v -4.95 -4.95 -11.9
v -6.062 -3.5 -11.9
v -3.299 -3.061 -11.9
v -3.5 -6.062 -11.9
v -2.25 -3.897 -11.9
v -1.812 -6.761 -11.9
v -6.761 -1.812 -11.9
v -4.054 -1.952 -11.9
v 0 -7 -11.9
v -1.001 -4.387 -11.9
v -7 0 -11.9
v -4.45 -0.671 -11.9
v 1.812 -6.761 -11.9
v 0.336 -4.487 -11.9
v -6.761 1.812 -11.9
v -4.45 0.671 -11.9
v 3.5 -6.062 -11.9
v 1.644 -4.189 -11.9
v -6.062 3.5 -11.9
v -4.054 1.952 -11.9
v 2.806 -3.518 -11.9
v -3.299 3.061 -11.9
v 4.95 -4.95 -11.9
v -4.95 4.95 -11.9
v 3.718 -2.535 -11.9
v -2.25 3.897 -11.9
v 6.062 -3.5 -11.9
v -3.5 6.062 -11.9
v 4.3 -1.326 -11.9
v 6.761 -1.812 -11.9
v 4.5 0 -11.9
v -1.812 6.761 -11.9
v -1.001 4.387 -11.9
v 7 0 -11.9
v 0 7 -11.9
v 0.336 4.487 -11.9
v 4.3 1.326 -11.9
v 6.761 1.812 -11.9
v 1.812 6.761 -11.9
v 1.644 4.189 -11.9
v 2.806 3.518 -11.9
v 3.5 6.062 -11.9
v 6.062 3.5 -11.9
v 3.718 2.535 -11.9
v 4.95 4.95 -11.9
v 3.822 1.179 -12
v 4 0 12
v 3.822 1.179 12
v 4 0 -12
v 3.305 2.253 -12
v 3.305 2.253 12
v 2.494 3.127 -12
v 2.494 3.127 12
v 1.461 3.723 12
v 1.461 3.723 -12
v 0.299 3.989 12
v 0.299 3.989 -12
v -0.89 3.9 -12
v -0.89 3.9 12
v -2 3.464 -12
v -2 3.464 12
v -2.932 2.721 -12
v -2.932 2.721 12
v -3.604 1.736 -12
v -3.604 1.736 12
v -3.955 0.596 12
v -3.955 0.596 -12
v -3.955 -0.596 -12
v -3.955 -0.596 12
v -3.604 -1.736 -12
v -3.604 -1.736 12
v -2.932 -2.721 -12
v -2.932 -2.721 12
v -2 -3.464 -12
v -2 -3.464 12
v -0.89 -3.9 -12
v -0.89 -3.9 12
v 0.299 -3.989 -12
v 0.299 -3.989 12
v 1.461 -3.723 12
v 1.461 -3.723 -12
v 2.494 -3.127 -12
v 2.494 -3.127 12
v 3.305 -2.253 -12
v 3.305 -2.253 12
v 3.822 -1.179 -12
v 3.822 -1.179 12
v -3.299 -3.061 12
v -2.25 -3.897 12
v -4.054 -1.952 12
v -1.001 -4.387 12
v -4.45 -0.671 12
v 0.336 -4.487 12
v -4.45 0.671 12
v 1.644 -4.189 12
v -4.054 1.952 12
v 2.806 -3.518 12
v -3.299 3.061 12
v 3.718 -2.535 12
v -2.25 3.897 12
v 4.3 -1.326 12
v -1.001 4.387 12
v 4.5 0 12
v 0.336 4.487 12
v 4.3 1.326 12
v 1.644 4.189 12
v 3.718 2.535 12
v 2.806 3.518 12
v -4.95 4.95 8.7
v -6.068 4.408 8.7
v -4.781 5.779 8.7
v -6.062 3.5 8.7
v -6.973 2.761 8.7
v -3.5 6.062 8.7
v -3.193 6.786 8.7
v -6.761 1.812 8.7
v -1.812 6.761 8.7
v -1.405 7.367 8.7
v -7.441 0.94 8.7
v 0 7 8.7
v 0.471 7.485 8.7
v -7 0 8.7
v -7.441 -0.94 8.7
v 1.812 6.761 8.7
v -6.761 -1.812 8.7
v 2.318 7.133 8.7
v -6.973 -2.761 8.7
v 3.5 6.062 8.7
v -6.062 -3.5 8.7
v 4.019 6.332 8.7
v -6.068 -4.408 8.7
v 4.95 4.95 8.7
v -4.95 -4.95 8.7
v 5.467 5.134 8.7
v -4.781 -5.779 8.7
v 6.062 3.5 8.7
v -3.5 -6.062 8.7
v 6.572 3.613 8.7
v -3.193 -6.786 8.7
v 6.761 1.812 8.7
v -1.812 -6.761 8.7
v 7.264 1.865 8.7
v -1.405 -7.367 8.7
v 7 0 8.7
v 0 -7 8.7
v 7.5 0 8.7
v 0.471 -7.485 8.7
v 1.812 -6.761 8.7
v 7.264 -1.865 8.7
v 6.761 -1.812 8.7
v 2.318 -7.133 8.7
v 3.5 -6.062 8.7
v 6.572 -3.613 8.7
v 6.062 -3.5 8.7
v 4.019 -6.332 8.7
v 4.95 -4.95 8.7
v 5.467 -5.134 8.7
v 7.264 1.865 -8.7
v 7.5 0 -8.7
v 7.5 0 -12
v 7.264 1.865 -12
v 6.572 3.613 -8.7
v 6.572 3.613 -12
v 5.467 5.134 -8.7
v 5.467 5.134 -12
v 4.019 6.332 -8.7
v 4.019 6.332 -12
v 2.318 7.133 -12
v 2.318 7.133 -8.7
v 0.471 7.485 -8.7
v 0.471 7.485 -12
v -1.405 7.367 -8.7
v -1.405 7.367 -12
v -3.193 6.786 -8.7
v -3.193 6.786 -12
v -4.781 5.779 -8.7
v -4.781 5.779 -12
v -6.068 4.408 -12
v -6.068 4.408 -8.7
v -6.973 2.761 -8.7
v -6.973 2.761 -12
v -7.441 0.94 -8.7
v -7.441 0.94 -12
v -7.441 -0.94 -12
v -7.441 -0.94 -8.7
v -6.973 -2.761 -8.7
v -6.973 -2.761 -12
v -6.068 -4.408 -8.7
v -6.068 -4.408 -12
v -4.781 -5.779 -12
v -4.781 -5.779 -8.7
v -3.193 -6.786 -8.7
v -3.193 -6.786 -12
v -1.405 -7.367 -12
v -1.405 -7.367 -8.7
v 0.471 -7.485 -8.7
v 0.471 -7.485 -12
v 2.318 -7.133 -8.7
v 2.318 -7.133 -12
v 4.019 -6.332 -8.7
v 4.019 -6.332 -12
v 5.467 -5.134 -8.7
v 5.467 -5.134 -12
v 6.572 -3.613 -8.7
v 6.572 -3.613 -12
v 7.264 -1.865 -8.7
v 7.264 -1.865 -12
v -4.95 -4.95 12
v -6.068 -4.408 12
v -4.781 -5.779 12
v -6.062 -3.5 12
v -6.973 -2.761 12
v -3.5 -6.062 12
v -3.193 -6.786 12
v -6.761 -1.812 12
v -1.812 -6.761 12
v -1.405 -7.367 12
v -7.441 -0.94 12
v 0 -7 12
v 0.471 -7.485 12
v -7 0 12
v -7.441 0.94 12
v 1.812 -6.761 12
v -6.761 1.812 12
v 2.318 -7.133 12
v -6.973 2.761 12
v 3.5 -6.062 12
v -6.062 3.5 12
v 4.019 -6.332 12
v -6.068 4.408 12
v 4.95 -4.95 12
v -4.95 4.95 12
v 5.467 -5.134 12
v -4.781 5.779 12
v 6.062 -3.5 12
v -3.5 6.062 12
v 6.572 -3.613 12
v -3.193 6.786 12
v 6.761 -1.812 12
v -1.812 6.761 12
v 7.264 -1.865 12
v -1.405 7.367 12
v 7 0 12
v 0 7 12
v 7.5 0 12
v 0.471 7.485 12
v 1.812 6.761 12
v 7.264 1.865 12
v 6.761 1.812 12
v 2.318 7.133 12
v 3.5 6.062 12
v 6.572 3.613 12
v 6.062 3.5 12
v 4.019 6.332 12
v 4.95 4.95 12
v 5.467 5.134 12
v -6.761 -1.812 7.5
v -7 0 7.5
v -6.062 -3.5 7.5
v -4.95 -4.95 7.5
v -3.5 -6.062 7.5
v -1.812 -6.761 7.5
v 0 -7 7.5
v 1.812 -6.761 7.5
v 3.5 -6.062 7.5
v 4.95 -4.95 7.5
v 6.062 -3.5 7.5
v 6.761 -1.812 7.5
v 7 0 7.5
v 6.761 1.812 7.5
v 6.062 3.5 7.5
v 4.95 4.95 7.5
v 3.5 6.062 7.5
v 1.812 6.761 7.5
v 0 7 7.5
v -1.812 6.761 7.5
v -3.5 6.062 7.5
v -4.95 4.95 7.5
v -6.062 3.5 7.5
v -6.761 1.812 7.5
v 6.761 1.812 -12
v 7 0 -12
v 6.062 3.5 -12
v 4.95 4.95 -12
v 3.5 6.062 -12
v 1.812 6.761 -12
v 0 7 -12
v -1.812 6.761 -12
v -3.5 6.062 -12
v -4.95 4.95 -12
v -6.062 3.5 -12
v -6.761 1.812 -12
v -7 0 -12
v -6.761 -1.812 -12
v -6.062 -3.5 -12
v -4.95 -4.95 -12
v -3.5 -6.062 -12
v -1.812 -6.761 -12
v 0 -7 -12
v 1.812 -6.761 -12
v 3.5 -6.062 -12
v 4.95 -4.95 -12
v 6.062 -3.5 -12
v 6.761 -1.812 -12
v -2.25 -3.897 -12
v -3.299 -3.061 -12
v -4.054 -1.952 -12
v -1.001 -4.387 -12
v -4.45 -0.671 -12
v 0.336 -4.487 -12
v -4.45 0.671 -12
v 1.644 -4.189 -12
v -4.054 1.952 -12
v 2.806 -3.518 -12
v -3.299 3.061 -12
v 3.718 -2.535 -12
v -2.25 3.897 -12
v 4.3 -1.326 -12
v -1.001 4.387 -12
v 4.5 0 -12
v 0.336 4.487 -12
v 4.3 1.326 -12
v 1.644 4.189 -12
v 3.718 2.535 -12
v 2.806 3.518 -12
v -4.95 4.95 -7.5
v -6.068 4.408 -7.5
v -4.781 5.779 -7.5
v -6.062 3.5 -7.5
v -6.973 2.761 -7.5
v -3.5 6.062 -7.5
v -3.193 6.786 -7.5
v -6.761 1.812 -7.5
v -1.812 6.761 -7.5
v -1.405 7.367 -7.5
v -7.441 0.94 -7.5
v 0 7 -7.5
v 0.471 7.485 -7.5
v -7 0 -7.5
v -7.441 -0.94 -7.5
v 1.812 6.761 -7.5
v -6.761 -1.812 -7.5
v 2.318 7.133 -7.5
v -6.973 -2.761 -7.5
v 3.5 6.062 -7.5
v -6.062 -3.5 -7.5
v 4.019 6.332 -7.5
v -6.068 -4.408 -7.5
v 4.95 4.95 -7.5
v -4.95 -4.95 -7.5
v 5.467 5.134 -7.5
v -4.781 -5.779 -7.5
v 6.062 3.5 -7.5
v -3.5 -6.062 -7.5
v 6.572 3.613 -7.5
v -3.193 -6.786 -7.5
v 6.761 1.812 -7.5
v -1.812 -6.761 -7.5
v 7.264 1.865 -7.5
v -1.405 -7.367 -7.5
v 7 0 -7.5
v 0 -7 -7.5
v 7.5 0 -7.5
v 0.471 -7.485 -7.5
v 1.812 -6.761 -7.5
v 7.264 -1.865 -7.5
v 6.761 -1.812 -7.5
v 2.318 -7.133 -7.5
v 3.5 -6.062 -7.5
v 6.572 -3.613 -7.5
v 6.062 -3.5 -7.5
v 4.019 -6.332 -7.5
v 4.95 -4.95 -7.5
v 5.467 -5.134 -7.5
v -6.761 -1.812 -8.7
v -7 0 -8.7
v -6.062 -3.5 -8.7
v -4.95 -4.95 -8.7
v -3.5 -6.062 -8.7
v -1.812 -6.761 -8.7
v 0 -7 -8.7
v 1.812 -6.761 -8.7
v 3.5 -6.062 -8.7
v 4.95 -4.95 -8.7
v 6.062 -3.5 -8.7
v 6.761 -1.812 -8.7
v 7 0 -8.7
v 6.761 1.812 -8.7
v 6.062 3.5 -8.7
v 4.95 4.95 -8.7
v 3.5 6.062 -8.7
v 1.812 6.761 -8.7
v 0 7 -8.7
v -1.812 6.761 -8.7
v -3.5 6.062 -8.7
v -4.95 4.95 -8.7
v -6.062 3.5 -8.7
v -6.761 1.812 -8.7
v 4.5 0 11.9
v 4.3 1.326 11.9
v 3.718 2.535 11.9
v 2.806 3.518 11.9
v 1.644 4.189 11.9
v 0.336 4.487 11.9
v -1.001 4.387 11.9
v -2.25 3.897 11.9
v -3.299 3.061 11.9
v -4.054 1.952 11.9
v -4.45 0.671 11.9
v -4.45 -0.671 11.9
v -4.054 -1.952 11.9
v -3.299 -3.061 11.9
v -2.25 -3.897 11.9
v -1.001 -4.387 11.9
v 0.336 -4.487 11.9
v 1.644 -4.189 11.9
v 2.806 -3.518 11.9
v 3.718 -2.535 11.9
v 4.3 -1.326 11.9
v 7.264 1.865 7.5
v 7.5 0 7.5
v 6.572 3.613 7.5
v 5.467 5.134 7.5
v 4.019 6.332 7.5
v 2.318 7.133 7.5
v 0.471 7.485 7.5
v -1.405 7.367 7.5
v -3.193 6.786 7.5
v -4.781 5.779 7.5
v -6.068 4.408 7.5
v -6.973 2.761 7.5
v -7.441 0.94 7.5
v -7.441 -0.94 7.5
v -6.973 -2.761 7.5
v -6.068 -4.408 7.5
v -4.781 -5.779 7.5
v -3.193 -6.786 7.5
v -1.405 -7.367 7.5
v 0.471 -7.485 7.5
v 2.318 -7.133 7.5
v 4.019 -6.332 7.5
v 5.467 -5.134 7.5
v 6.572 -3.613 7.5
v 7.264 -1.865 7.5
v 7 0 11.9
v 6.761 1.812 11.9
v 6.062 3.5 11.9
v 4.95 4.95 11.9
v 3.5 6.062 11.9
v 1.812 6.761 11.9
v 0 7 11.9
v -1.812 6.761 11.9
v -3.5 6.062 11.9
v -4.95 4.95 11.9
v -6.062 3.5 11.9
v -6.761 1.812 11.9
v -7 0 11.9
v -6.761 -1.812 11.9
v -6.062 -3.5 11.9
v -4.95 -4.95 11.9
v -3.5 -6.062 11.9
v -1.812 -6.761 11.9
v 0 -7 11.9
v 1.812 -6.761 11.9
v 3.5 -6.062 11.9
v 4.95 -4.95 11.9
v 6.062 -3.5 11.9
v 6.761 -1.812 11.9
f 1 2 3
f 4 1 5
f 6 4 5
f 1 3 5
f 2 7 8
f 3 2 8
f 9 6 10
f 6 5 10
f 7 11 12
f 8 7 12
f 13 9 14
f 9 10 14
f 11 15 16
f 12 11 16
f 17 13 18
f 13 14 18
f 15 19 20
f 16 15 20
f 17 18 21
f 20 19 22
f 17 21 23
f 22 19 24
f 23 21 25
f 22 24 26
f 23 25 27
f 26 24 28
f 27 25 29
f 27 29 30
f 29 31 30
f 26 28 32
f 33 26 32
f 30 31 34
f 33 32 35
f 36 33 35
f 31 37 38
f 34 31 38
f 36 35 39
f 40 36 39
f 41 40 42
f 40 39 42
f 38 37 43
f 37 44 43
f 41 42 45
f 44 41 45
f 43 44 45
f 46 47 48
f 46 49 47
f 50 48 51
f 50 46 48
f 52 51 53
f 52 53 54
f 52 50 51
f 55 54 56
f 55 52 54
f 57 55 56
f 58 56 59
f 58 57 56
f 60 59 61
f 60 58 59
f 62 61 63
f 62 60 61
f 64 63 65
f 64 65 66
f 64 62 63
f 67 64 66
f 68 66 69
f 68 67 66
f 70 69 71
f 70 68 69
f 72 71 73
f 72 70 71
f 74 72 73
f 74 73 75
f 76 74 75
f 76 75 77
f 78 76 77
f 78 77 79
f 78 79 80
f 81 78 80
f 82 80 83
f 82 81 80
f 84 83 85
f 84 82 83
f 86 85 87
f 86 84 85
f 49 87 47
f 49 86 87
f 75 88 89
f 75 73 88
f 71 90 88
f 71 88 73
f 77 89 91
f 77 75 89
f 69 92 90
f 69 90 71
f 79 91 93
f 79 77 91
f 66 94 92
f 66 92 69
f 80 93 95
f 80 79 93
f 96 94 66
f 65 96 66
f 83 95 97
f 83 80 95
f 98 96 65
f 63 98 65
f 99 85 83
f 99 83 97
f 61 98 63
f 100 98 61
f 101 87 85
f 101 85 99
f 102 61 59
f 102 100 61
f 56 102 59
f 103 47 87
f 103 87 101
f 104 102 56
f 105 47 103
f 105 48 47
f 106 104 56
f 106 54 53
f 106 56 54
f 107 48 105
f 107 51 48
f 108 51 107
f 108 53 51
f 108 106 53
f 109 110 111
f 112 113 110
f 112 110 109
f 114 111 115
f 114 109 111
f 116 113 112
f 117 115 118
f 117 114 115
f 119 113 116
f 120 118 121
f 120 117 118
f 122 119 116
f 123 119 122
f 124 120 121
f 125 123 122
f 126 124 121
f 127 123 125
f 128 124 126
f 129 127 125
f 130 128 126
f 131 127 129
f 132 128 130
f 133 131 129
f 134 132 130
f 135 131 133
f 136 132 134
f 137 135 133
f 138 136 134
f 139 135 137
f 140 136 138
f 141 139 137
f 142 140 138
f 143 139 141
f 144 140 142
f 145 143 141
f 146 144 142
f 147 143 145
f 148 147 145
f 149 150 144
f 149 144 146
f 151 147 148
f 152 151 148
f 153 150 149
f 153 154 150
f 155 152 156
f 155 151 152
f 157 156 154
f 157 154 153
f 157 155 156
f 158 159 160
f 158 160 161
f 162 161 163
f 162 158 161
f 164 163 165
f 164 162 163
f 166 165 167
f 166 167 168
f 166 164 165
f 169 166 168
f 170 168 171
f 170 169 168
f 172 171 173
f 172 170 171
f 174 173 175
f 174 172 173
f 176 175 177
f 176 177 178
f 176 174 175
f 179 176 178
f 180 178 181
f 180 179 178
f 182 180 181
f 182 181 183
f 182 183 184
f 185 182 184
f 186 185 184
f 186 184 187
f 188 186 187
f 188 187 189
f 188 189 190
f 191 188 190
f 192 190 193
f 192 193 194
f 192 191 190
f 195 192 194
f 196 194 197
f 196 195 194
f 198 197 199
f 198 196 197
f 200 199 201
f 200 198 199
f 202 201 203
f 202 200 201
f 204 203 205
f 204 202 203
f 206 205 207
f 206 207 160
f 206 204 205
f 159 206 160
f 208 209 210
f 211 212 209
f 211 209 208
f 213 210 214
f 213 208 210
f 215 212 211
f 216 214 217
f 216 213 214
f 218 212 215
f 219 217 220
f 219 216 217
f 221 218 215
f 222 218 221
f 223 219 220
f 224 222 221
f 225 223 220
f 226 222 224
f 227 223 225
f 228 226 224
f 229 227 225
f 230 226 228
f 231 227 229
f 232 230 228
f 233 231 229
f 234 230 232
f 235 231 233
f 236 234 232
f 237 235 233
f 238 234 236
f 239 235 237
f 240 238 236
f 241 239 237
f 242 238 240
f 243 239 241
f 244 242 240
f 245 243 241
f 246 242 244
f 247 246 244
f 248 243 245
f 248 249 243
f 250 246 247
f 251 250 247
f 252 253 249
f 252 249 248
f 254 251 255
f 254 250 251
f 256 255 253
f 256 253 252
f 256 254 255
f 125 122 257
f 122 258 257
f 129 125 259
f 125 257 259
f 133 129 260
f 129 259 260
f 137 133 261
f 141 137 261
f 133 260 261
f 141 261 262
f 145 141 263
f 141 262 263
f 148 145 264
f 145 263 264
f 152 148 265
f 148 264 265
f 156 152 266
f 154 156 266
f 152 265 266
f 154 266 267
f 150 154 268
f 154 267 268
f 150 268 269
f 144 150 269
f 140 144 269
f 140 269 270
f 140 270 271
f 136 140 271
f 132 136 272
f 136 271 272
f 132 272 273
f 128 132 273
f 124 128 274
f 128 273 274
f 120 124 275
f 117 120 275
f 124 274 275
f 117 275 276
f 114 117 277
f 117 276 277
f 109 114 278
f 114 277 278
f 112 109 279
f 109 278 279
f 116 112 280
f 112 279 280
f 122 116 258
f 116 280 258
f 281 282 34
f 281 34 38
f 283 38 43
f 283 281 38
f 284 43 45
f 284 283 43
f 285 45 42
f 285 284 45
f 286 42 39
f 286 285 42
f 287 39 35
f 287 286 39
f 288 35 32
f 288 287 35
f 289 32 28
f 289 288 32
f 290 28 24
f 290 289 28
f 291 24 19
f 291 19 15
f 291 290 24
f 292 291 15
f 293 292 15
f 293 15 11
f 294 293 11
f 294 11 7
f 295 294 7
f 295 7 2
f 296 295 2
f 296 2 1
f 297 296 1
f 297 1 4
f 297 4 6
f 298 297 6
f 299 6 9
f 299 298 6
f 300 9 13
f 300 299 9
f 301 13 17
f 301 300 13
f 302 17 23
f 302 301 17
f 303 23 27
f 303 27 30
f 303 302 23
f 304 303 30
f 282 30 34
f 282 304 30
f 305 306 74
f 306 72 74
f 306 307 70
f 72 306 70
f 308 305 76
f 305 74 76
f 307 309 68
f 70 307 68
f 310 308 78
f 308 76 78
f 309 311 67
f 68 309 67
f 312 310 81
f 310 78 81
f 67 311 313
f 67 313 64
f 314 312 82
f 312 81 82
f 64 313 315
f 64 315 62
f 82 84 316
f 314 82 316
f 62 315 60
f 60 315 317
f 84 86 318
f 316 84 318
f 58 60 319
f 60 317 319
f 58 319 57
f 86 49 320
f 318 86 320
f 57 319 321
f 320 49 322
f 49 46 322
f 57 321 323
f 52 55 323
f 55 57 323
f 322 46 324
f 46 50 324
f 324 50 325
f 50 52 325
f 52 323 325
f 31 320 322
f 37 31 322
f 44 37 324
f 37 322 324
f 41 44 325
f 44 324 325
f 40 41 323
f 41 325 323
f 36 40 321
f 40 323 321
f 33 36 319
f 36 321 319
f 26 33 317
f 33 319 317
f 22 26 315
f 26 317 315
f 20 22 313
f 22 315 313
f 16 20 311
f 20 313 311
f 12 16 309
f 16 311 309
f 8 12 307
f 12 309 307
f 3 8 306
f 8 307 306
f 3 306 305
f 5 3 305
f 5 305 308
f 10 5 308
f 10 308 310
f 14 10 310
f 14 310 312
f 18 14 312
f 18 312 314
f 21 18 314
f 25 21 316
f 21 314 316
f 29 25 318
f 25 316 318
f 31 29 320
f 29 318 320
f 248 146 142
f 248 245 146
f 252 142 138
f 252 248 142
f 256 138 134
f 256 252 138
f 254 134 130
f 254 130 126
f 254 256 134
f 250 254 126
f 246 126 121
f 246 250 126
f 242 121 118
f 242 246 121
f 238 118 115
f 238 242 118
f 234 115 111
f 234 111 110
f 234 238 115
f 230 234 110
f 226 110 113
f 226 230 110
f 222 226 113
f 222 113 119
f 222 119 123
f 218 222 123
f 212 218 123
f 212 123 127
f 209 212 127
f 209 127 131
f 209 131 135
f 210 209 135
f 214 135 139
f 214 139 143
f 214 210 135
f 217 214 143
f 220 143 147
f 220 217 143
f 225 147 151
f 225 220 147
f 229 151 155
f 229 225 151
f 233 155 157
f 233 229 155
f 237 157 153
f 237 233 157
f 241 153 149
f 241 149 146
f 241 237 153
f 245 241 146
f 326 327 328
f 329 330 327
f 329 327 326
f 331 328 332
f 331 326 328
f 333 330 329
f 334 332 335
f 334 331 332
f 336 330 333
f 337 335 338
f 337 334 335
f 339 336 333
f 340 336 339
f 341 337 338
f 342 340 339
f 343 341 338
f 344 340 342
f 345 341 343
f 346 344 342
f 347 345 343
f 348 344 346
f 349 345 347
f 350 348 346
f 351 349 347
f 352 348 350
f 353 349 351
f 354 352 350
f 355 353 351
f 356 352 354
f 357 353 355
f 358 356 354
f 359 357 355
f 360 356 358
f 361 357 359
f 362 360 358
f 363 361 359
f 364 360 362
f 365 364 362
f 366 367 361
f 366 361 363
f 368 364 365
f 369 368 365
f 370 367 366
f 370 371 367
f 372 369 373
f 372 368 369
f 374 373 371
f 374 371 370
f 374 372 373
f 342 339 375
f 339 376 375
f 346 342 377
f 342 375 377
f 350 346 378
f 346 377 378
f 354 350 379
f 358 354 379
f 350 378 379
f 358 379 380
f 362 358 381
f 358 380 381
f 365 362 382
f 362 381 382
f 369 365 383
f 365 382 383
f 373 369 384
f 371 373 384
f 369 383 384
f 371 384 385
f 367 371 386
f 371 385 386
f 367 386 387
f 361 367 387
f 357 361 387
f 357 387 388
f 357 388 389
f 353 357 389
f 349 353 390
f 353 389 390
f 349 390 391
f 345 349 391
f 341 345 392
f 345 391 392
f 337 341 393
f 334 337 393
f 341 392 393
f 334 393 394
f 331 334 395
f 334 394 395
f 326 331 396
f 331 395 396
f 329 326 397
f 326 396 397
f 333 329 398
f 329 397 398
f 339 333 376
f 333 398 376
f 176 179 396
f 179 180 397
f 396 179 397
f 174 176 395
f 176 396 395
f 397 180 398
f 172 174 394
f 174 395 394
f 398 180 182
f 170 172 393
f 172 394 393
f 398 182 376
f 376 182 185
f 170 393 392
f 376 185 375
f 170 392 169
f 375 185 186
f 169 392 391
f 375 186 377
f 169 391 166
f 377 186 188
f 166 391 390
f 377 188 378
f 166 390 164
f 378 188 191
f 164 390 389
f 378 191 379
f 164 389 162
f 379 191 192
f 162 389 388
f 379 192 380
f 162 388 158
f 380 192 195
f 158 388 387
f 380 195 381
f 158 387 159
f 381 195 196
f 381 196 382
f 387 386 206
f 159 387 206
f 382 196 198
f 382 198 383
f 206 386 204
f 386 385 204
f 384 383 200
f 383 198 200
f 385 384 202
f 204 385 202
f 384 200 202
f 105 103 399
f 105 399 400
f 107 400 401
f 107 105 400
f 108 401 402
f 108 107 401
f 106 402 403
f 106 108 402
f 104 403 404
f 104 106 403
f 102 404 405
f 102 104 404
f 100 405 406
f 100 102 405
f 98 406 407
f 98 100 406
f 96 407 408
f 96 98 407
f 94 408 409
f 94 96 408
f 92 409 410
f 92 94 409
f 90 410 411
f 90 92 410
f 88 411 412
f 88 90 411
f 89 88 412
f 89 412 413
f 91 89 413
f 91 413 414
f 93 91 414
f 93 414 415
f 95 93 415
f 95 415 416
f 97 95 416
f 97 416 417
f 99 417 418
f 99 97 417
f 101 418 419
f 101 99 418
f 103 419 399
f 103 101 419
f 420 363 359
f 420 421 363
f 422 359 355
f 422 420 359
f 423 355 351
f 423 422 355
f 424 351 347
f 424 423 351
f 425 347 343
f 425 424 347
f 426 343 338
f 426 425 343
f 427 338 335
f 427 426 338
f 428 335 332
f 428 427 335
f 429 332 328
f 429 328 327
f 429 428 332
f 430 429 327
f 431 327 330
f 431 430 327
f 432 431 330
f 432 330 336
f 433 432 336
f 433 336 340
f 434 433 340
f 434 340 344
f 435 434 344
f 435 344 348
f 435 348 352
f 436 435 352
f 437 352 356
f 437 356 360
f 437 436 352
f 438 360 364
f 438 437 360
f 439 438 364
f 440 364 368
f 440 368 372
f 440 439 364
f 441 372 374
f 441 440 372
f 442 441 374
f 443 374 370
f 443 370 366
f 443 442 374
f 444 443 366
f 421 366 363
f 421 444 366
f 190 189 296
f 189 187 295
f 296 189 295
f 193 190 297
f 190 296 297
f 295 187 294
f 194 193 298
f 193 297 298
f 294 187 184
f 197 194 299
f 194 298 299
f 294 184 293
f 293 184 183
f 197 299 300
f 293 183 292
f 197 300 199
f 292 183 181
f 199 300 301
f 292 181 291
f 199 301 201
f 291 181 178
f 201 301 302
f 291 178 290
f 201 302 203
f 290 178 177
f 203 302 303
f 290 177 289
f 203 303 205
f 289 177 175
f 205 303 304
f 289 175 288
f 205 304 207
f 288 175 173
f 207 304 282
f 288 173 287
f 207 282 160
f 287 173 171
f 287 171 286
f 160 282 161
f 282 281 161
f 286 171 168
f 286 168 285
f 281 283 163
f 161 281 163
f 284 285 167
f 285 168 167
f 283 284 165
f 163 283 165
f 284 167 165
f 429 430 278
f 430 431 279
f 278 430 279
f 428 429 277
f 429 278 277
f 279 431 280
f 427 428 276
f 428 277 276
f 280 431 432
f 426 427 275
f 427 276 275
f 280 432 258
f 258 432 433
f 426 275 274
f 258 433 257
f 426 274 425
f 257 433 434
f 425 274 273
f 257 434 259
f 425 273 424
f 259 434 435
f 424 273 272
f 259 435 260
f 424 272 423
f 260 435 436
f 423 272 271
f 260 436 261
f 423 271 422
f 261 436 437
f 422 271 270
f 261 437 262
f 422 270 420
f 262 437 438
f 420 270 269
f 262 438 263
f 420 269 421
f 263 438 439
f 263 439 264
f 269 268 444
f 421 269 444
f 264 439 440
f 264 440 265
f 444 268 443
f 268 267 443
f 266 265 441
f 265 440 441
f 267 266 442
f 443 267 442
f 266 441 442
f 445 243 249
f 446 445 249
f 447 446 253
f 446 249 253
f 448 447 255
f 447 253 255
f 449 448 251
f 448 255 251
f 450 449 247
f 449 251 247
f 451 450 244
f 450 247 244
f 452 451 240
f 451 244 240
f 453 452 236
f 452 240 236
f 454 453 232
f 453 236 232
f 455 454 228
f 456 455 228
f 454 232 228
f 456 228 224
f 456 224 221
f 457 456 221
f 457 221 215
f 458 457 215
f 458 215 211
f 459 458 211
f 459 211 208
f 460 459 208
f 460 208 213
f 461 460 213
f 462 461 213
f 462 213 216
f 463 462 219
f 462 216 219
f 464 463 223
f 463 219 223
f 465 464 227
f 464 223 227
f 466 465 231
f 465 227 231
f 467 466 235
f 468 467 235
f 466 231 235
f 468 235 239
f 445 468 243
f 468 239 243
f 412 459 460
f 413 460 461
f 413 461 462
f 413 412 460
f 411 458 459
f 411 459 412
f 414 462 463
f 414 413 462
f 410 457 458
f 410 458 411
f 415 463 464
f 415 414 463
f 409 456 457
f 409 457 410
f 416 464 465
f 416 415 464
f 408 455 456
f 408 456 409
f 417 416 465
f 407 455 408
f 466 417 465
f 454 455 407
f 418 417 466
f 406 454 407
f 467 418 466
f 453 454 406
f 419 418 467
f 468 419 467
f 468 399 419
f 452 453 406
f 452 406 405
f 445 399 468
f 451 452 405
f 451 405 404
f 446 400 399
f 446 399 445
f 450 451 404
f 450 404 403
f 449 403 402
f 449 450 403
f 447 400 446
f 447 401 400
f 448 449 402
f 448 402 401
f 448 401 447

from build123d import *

# Parameters (mm, degrees)
ESBO_O1_R                = 7.5
ESBO_O1_R_2              = 4
RESSALTO_EXTRUS_O1_DEPTH = 12
ESBO_O2_R                = 7
ESBO_O2_R_2              = 4.5
CORTE_EXTRUS_O1_DEPTH    = 0.1
ESBO_O3_W                = 1.2
ESBO_O3_H                = 1


with BuildPart() as part:
    # Esboço1 → Ressalto-extrusão1 (new, symmetric)
    with BuildSketch(Plane.XY):
        Circle(ESBO_O1_R)
        Circle(ESBO_O1_R_2, mode=Mode.SUBTRACT)
    extrude(amount=RESSALTO_EXTRUS_O1_DEPTH, both=True)

    # Esboço2 → Corte-extrusão1 (cut)
    with BuildSketch(Plane.XY.offset(12)):
        Circle(ESBO_O2_R)
        Circle(ESBO_O2_R_2, mode=Mode.SUBTRACT)
    corte_extrus_o1 = extrude(amount=-CORTE_EXTRUS_O1_DEPTH, mode=Mode.SUBTRACT)

    # Espelhar1: Corte-extrusão1 across plane
    add(corte_extrus_o1.mirror(Plane.XY), mode=Mode.SUBTRACT)

    # Esboço3 → Corte-Revolução1 (revolve, cut)
    with BuildSketch(Plane(origin=(0, 0, 0), x_dir=(0, 0, -1), z_dir=(1, 0, 0)), mode=Mode.PRIVATE) as corte_revolu_o1_sk:
        with Locations((-8.1, 7.5)):
            Rectangle(ESBO_O3_W, ESBO_O3_H)
        with Locations((8.1, 7.5)):
            Rectangle(ESBO_O3_W, ESBO_O3_H)
    revolve(corte_revolu_o1_sk.sketch.rotate(Axis((0, 0, 0), (0, 0, 1)), 90), axis=Axis((0, 0, 0), (0, 0, 1)), mode=Mode.SUBTRACT)


solid = part.part
